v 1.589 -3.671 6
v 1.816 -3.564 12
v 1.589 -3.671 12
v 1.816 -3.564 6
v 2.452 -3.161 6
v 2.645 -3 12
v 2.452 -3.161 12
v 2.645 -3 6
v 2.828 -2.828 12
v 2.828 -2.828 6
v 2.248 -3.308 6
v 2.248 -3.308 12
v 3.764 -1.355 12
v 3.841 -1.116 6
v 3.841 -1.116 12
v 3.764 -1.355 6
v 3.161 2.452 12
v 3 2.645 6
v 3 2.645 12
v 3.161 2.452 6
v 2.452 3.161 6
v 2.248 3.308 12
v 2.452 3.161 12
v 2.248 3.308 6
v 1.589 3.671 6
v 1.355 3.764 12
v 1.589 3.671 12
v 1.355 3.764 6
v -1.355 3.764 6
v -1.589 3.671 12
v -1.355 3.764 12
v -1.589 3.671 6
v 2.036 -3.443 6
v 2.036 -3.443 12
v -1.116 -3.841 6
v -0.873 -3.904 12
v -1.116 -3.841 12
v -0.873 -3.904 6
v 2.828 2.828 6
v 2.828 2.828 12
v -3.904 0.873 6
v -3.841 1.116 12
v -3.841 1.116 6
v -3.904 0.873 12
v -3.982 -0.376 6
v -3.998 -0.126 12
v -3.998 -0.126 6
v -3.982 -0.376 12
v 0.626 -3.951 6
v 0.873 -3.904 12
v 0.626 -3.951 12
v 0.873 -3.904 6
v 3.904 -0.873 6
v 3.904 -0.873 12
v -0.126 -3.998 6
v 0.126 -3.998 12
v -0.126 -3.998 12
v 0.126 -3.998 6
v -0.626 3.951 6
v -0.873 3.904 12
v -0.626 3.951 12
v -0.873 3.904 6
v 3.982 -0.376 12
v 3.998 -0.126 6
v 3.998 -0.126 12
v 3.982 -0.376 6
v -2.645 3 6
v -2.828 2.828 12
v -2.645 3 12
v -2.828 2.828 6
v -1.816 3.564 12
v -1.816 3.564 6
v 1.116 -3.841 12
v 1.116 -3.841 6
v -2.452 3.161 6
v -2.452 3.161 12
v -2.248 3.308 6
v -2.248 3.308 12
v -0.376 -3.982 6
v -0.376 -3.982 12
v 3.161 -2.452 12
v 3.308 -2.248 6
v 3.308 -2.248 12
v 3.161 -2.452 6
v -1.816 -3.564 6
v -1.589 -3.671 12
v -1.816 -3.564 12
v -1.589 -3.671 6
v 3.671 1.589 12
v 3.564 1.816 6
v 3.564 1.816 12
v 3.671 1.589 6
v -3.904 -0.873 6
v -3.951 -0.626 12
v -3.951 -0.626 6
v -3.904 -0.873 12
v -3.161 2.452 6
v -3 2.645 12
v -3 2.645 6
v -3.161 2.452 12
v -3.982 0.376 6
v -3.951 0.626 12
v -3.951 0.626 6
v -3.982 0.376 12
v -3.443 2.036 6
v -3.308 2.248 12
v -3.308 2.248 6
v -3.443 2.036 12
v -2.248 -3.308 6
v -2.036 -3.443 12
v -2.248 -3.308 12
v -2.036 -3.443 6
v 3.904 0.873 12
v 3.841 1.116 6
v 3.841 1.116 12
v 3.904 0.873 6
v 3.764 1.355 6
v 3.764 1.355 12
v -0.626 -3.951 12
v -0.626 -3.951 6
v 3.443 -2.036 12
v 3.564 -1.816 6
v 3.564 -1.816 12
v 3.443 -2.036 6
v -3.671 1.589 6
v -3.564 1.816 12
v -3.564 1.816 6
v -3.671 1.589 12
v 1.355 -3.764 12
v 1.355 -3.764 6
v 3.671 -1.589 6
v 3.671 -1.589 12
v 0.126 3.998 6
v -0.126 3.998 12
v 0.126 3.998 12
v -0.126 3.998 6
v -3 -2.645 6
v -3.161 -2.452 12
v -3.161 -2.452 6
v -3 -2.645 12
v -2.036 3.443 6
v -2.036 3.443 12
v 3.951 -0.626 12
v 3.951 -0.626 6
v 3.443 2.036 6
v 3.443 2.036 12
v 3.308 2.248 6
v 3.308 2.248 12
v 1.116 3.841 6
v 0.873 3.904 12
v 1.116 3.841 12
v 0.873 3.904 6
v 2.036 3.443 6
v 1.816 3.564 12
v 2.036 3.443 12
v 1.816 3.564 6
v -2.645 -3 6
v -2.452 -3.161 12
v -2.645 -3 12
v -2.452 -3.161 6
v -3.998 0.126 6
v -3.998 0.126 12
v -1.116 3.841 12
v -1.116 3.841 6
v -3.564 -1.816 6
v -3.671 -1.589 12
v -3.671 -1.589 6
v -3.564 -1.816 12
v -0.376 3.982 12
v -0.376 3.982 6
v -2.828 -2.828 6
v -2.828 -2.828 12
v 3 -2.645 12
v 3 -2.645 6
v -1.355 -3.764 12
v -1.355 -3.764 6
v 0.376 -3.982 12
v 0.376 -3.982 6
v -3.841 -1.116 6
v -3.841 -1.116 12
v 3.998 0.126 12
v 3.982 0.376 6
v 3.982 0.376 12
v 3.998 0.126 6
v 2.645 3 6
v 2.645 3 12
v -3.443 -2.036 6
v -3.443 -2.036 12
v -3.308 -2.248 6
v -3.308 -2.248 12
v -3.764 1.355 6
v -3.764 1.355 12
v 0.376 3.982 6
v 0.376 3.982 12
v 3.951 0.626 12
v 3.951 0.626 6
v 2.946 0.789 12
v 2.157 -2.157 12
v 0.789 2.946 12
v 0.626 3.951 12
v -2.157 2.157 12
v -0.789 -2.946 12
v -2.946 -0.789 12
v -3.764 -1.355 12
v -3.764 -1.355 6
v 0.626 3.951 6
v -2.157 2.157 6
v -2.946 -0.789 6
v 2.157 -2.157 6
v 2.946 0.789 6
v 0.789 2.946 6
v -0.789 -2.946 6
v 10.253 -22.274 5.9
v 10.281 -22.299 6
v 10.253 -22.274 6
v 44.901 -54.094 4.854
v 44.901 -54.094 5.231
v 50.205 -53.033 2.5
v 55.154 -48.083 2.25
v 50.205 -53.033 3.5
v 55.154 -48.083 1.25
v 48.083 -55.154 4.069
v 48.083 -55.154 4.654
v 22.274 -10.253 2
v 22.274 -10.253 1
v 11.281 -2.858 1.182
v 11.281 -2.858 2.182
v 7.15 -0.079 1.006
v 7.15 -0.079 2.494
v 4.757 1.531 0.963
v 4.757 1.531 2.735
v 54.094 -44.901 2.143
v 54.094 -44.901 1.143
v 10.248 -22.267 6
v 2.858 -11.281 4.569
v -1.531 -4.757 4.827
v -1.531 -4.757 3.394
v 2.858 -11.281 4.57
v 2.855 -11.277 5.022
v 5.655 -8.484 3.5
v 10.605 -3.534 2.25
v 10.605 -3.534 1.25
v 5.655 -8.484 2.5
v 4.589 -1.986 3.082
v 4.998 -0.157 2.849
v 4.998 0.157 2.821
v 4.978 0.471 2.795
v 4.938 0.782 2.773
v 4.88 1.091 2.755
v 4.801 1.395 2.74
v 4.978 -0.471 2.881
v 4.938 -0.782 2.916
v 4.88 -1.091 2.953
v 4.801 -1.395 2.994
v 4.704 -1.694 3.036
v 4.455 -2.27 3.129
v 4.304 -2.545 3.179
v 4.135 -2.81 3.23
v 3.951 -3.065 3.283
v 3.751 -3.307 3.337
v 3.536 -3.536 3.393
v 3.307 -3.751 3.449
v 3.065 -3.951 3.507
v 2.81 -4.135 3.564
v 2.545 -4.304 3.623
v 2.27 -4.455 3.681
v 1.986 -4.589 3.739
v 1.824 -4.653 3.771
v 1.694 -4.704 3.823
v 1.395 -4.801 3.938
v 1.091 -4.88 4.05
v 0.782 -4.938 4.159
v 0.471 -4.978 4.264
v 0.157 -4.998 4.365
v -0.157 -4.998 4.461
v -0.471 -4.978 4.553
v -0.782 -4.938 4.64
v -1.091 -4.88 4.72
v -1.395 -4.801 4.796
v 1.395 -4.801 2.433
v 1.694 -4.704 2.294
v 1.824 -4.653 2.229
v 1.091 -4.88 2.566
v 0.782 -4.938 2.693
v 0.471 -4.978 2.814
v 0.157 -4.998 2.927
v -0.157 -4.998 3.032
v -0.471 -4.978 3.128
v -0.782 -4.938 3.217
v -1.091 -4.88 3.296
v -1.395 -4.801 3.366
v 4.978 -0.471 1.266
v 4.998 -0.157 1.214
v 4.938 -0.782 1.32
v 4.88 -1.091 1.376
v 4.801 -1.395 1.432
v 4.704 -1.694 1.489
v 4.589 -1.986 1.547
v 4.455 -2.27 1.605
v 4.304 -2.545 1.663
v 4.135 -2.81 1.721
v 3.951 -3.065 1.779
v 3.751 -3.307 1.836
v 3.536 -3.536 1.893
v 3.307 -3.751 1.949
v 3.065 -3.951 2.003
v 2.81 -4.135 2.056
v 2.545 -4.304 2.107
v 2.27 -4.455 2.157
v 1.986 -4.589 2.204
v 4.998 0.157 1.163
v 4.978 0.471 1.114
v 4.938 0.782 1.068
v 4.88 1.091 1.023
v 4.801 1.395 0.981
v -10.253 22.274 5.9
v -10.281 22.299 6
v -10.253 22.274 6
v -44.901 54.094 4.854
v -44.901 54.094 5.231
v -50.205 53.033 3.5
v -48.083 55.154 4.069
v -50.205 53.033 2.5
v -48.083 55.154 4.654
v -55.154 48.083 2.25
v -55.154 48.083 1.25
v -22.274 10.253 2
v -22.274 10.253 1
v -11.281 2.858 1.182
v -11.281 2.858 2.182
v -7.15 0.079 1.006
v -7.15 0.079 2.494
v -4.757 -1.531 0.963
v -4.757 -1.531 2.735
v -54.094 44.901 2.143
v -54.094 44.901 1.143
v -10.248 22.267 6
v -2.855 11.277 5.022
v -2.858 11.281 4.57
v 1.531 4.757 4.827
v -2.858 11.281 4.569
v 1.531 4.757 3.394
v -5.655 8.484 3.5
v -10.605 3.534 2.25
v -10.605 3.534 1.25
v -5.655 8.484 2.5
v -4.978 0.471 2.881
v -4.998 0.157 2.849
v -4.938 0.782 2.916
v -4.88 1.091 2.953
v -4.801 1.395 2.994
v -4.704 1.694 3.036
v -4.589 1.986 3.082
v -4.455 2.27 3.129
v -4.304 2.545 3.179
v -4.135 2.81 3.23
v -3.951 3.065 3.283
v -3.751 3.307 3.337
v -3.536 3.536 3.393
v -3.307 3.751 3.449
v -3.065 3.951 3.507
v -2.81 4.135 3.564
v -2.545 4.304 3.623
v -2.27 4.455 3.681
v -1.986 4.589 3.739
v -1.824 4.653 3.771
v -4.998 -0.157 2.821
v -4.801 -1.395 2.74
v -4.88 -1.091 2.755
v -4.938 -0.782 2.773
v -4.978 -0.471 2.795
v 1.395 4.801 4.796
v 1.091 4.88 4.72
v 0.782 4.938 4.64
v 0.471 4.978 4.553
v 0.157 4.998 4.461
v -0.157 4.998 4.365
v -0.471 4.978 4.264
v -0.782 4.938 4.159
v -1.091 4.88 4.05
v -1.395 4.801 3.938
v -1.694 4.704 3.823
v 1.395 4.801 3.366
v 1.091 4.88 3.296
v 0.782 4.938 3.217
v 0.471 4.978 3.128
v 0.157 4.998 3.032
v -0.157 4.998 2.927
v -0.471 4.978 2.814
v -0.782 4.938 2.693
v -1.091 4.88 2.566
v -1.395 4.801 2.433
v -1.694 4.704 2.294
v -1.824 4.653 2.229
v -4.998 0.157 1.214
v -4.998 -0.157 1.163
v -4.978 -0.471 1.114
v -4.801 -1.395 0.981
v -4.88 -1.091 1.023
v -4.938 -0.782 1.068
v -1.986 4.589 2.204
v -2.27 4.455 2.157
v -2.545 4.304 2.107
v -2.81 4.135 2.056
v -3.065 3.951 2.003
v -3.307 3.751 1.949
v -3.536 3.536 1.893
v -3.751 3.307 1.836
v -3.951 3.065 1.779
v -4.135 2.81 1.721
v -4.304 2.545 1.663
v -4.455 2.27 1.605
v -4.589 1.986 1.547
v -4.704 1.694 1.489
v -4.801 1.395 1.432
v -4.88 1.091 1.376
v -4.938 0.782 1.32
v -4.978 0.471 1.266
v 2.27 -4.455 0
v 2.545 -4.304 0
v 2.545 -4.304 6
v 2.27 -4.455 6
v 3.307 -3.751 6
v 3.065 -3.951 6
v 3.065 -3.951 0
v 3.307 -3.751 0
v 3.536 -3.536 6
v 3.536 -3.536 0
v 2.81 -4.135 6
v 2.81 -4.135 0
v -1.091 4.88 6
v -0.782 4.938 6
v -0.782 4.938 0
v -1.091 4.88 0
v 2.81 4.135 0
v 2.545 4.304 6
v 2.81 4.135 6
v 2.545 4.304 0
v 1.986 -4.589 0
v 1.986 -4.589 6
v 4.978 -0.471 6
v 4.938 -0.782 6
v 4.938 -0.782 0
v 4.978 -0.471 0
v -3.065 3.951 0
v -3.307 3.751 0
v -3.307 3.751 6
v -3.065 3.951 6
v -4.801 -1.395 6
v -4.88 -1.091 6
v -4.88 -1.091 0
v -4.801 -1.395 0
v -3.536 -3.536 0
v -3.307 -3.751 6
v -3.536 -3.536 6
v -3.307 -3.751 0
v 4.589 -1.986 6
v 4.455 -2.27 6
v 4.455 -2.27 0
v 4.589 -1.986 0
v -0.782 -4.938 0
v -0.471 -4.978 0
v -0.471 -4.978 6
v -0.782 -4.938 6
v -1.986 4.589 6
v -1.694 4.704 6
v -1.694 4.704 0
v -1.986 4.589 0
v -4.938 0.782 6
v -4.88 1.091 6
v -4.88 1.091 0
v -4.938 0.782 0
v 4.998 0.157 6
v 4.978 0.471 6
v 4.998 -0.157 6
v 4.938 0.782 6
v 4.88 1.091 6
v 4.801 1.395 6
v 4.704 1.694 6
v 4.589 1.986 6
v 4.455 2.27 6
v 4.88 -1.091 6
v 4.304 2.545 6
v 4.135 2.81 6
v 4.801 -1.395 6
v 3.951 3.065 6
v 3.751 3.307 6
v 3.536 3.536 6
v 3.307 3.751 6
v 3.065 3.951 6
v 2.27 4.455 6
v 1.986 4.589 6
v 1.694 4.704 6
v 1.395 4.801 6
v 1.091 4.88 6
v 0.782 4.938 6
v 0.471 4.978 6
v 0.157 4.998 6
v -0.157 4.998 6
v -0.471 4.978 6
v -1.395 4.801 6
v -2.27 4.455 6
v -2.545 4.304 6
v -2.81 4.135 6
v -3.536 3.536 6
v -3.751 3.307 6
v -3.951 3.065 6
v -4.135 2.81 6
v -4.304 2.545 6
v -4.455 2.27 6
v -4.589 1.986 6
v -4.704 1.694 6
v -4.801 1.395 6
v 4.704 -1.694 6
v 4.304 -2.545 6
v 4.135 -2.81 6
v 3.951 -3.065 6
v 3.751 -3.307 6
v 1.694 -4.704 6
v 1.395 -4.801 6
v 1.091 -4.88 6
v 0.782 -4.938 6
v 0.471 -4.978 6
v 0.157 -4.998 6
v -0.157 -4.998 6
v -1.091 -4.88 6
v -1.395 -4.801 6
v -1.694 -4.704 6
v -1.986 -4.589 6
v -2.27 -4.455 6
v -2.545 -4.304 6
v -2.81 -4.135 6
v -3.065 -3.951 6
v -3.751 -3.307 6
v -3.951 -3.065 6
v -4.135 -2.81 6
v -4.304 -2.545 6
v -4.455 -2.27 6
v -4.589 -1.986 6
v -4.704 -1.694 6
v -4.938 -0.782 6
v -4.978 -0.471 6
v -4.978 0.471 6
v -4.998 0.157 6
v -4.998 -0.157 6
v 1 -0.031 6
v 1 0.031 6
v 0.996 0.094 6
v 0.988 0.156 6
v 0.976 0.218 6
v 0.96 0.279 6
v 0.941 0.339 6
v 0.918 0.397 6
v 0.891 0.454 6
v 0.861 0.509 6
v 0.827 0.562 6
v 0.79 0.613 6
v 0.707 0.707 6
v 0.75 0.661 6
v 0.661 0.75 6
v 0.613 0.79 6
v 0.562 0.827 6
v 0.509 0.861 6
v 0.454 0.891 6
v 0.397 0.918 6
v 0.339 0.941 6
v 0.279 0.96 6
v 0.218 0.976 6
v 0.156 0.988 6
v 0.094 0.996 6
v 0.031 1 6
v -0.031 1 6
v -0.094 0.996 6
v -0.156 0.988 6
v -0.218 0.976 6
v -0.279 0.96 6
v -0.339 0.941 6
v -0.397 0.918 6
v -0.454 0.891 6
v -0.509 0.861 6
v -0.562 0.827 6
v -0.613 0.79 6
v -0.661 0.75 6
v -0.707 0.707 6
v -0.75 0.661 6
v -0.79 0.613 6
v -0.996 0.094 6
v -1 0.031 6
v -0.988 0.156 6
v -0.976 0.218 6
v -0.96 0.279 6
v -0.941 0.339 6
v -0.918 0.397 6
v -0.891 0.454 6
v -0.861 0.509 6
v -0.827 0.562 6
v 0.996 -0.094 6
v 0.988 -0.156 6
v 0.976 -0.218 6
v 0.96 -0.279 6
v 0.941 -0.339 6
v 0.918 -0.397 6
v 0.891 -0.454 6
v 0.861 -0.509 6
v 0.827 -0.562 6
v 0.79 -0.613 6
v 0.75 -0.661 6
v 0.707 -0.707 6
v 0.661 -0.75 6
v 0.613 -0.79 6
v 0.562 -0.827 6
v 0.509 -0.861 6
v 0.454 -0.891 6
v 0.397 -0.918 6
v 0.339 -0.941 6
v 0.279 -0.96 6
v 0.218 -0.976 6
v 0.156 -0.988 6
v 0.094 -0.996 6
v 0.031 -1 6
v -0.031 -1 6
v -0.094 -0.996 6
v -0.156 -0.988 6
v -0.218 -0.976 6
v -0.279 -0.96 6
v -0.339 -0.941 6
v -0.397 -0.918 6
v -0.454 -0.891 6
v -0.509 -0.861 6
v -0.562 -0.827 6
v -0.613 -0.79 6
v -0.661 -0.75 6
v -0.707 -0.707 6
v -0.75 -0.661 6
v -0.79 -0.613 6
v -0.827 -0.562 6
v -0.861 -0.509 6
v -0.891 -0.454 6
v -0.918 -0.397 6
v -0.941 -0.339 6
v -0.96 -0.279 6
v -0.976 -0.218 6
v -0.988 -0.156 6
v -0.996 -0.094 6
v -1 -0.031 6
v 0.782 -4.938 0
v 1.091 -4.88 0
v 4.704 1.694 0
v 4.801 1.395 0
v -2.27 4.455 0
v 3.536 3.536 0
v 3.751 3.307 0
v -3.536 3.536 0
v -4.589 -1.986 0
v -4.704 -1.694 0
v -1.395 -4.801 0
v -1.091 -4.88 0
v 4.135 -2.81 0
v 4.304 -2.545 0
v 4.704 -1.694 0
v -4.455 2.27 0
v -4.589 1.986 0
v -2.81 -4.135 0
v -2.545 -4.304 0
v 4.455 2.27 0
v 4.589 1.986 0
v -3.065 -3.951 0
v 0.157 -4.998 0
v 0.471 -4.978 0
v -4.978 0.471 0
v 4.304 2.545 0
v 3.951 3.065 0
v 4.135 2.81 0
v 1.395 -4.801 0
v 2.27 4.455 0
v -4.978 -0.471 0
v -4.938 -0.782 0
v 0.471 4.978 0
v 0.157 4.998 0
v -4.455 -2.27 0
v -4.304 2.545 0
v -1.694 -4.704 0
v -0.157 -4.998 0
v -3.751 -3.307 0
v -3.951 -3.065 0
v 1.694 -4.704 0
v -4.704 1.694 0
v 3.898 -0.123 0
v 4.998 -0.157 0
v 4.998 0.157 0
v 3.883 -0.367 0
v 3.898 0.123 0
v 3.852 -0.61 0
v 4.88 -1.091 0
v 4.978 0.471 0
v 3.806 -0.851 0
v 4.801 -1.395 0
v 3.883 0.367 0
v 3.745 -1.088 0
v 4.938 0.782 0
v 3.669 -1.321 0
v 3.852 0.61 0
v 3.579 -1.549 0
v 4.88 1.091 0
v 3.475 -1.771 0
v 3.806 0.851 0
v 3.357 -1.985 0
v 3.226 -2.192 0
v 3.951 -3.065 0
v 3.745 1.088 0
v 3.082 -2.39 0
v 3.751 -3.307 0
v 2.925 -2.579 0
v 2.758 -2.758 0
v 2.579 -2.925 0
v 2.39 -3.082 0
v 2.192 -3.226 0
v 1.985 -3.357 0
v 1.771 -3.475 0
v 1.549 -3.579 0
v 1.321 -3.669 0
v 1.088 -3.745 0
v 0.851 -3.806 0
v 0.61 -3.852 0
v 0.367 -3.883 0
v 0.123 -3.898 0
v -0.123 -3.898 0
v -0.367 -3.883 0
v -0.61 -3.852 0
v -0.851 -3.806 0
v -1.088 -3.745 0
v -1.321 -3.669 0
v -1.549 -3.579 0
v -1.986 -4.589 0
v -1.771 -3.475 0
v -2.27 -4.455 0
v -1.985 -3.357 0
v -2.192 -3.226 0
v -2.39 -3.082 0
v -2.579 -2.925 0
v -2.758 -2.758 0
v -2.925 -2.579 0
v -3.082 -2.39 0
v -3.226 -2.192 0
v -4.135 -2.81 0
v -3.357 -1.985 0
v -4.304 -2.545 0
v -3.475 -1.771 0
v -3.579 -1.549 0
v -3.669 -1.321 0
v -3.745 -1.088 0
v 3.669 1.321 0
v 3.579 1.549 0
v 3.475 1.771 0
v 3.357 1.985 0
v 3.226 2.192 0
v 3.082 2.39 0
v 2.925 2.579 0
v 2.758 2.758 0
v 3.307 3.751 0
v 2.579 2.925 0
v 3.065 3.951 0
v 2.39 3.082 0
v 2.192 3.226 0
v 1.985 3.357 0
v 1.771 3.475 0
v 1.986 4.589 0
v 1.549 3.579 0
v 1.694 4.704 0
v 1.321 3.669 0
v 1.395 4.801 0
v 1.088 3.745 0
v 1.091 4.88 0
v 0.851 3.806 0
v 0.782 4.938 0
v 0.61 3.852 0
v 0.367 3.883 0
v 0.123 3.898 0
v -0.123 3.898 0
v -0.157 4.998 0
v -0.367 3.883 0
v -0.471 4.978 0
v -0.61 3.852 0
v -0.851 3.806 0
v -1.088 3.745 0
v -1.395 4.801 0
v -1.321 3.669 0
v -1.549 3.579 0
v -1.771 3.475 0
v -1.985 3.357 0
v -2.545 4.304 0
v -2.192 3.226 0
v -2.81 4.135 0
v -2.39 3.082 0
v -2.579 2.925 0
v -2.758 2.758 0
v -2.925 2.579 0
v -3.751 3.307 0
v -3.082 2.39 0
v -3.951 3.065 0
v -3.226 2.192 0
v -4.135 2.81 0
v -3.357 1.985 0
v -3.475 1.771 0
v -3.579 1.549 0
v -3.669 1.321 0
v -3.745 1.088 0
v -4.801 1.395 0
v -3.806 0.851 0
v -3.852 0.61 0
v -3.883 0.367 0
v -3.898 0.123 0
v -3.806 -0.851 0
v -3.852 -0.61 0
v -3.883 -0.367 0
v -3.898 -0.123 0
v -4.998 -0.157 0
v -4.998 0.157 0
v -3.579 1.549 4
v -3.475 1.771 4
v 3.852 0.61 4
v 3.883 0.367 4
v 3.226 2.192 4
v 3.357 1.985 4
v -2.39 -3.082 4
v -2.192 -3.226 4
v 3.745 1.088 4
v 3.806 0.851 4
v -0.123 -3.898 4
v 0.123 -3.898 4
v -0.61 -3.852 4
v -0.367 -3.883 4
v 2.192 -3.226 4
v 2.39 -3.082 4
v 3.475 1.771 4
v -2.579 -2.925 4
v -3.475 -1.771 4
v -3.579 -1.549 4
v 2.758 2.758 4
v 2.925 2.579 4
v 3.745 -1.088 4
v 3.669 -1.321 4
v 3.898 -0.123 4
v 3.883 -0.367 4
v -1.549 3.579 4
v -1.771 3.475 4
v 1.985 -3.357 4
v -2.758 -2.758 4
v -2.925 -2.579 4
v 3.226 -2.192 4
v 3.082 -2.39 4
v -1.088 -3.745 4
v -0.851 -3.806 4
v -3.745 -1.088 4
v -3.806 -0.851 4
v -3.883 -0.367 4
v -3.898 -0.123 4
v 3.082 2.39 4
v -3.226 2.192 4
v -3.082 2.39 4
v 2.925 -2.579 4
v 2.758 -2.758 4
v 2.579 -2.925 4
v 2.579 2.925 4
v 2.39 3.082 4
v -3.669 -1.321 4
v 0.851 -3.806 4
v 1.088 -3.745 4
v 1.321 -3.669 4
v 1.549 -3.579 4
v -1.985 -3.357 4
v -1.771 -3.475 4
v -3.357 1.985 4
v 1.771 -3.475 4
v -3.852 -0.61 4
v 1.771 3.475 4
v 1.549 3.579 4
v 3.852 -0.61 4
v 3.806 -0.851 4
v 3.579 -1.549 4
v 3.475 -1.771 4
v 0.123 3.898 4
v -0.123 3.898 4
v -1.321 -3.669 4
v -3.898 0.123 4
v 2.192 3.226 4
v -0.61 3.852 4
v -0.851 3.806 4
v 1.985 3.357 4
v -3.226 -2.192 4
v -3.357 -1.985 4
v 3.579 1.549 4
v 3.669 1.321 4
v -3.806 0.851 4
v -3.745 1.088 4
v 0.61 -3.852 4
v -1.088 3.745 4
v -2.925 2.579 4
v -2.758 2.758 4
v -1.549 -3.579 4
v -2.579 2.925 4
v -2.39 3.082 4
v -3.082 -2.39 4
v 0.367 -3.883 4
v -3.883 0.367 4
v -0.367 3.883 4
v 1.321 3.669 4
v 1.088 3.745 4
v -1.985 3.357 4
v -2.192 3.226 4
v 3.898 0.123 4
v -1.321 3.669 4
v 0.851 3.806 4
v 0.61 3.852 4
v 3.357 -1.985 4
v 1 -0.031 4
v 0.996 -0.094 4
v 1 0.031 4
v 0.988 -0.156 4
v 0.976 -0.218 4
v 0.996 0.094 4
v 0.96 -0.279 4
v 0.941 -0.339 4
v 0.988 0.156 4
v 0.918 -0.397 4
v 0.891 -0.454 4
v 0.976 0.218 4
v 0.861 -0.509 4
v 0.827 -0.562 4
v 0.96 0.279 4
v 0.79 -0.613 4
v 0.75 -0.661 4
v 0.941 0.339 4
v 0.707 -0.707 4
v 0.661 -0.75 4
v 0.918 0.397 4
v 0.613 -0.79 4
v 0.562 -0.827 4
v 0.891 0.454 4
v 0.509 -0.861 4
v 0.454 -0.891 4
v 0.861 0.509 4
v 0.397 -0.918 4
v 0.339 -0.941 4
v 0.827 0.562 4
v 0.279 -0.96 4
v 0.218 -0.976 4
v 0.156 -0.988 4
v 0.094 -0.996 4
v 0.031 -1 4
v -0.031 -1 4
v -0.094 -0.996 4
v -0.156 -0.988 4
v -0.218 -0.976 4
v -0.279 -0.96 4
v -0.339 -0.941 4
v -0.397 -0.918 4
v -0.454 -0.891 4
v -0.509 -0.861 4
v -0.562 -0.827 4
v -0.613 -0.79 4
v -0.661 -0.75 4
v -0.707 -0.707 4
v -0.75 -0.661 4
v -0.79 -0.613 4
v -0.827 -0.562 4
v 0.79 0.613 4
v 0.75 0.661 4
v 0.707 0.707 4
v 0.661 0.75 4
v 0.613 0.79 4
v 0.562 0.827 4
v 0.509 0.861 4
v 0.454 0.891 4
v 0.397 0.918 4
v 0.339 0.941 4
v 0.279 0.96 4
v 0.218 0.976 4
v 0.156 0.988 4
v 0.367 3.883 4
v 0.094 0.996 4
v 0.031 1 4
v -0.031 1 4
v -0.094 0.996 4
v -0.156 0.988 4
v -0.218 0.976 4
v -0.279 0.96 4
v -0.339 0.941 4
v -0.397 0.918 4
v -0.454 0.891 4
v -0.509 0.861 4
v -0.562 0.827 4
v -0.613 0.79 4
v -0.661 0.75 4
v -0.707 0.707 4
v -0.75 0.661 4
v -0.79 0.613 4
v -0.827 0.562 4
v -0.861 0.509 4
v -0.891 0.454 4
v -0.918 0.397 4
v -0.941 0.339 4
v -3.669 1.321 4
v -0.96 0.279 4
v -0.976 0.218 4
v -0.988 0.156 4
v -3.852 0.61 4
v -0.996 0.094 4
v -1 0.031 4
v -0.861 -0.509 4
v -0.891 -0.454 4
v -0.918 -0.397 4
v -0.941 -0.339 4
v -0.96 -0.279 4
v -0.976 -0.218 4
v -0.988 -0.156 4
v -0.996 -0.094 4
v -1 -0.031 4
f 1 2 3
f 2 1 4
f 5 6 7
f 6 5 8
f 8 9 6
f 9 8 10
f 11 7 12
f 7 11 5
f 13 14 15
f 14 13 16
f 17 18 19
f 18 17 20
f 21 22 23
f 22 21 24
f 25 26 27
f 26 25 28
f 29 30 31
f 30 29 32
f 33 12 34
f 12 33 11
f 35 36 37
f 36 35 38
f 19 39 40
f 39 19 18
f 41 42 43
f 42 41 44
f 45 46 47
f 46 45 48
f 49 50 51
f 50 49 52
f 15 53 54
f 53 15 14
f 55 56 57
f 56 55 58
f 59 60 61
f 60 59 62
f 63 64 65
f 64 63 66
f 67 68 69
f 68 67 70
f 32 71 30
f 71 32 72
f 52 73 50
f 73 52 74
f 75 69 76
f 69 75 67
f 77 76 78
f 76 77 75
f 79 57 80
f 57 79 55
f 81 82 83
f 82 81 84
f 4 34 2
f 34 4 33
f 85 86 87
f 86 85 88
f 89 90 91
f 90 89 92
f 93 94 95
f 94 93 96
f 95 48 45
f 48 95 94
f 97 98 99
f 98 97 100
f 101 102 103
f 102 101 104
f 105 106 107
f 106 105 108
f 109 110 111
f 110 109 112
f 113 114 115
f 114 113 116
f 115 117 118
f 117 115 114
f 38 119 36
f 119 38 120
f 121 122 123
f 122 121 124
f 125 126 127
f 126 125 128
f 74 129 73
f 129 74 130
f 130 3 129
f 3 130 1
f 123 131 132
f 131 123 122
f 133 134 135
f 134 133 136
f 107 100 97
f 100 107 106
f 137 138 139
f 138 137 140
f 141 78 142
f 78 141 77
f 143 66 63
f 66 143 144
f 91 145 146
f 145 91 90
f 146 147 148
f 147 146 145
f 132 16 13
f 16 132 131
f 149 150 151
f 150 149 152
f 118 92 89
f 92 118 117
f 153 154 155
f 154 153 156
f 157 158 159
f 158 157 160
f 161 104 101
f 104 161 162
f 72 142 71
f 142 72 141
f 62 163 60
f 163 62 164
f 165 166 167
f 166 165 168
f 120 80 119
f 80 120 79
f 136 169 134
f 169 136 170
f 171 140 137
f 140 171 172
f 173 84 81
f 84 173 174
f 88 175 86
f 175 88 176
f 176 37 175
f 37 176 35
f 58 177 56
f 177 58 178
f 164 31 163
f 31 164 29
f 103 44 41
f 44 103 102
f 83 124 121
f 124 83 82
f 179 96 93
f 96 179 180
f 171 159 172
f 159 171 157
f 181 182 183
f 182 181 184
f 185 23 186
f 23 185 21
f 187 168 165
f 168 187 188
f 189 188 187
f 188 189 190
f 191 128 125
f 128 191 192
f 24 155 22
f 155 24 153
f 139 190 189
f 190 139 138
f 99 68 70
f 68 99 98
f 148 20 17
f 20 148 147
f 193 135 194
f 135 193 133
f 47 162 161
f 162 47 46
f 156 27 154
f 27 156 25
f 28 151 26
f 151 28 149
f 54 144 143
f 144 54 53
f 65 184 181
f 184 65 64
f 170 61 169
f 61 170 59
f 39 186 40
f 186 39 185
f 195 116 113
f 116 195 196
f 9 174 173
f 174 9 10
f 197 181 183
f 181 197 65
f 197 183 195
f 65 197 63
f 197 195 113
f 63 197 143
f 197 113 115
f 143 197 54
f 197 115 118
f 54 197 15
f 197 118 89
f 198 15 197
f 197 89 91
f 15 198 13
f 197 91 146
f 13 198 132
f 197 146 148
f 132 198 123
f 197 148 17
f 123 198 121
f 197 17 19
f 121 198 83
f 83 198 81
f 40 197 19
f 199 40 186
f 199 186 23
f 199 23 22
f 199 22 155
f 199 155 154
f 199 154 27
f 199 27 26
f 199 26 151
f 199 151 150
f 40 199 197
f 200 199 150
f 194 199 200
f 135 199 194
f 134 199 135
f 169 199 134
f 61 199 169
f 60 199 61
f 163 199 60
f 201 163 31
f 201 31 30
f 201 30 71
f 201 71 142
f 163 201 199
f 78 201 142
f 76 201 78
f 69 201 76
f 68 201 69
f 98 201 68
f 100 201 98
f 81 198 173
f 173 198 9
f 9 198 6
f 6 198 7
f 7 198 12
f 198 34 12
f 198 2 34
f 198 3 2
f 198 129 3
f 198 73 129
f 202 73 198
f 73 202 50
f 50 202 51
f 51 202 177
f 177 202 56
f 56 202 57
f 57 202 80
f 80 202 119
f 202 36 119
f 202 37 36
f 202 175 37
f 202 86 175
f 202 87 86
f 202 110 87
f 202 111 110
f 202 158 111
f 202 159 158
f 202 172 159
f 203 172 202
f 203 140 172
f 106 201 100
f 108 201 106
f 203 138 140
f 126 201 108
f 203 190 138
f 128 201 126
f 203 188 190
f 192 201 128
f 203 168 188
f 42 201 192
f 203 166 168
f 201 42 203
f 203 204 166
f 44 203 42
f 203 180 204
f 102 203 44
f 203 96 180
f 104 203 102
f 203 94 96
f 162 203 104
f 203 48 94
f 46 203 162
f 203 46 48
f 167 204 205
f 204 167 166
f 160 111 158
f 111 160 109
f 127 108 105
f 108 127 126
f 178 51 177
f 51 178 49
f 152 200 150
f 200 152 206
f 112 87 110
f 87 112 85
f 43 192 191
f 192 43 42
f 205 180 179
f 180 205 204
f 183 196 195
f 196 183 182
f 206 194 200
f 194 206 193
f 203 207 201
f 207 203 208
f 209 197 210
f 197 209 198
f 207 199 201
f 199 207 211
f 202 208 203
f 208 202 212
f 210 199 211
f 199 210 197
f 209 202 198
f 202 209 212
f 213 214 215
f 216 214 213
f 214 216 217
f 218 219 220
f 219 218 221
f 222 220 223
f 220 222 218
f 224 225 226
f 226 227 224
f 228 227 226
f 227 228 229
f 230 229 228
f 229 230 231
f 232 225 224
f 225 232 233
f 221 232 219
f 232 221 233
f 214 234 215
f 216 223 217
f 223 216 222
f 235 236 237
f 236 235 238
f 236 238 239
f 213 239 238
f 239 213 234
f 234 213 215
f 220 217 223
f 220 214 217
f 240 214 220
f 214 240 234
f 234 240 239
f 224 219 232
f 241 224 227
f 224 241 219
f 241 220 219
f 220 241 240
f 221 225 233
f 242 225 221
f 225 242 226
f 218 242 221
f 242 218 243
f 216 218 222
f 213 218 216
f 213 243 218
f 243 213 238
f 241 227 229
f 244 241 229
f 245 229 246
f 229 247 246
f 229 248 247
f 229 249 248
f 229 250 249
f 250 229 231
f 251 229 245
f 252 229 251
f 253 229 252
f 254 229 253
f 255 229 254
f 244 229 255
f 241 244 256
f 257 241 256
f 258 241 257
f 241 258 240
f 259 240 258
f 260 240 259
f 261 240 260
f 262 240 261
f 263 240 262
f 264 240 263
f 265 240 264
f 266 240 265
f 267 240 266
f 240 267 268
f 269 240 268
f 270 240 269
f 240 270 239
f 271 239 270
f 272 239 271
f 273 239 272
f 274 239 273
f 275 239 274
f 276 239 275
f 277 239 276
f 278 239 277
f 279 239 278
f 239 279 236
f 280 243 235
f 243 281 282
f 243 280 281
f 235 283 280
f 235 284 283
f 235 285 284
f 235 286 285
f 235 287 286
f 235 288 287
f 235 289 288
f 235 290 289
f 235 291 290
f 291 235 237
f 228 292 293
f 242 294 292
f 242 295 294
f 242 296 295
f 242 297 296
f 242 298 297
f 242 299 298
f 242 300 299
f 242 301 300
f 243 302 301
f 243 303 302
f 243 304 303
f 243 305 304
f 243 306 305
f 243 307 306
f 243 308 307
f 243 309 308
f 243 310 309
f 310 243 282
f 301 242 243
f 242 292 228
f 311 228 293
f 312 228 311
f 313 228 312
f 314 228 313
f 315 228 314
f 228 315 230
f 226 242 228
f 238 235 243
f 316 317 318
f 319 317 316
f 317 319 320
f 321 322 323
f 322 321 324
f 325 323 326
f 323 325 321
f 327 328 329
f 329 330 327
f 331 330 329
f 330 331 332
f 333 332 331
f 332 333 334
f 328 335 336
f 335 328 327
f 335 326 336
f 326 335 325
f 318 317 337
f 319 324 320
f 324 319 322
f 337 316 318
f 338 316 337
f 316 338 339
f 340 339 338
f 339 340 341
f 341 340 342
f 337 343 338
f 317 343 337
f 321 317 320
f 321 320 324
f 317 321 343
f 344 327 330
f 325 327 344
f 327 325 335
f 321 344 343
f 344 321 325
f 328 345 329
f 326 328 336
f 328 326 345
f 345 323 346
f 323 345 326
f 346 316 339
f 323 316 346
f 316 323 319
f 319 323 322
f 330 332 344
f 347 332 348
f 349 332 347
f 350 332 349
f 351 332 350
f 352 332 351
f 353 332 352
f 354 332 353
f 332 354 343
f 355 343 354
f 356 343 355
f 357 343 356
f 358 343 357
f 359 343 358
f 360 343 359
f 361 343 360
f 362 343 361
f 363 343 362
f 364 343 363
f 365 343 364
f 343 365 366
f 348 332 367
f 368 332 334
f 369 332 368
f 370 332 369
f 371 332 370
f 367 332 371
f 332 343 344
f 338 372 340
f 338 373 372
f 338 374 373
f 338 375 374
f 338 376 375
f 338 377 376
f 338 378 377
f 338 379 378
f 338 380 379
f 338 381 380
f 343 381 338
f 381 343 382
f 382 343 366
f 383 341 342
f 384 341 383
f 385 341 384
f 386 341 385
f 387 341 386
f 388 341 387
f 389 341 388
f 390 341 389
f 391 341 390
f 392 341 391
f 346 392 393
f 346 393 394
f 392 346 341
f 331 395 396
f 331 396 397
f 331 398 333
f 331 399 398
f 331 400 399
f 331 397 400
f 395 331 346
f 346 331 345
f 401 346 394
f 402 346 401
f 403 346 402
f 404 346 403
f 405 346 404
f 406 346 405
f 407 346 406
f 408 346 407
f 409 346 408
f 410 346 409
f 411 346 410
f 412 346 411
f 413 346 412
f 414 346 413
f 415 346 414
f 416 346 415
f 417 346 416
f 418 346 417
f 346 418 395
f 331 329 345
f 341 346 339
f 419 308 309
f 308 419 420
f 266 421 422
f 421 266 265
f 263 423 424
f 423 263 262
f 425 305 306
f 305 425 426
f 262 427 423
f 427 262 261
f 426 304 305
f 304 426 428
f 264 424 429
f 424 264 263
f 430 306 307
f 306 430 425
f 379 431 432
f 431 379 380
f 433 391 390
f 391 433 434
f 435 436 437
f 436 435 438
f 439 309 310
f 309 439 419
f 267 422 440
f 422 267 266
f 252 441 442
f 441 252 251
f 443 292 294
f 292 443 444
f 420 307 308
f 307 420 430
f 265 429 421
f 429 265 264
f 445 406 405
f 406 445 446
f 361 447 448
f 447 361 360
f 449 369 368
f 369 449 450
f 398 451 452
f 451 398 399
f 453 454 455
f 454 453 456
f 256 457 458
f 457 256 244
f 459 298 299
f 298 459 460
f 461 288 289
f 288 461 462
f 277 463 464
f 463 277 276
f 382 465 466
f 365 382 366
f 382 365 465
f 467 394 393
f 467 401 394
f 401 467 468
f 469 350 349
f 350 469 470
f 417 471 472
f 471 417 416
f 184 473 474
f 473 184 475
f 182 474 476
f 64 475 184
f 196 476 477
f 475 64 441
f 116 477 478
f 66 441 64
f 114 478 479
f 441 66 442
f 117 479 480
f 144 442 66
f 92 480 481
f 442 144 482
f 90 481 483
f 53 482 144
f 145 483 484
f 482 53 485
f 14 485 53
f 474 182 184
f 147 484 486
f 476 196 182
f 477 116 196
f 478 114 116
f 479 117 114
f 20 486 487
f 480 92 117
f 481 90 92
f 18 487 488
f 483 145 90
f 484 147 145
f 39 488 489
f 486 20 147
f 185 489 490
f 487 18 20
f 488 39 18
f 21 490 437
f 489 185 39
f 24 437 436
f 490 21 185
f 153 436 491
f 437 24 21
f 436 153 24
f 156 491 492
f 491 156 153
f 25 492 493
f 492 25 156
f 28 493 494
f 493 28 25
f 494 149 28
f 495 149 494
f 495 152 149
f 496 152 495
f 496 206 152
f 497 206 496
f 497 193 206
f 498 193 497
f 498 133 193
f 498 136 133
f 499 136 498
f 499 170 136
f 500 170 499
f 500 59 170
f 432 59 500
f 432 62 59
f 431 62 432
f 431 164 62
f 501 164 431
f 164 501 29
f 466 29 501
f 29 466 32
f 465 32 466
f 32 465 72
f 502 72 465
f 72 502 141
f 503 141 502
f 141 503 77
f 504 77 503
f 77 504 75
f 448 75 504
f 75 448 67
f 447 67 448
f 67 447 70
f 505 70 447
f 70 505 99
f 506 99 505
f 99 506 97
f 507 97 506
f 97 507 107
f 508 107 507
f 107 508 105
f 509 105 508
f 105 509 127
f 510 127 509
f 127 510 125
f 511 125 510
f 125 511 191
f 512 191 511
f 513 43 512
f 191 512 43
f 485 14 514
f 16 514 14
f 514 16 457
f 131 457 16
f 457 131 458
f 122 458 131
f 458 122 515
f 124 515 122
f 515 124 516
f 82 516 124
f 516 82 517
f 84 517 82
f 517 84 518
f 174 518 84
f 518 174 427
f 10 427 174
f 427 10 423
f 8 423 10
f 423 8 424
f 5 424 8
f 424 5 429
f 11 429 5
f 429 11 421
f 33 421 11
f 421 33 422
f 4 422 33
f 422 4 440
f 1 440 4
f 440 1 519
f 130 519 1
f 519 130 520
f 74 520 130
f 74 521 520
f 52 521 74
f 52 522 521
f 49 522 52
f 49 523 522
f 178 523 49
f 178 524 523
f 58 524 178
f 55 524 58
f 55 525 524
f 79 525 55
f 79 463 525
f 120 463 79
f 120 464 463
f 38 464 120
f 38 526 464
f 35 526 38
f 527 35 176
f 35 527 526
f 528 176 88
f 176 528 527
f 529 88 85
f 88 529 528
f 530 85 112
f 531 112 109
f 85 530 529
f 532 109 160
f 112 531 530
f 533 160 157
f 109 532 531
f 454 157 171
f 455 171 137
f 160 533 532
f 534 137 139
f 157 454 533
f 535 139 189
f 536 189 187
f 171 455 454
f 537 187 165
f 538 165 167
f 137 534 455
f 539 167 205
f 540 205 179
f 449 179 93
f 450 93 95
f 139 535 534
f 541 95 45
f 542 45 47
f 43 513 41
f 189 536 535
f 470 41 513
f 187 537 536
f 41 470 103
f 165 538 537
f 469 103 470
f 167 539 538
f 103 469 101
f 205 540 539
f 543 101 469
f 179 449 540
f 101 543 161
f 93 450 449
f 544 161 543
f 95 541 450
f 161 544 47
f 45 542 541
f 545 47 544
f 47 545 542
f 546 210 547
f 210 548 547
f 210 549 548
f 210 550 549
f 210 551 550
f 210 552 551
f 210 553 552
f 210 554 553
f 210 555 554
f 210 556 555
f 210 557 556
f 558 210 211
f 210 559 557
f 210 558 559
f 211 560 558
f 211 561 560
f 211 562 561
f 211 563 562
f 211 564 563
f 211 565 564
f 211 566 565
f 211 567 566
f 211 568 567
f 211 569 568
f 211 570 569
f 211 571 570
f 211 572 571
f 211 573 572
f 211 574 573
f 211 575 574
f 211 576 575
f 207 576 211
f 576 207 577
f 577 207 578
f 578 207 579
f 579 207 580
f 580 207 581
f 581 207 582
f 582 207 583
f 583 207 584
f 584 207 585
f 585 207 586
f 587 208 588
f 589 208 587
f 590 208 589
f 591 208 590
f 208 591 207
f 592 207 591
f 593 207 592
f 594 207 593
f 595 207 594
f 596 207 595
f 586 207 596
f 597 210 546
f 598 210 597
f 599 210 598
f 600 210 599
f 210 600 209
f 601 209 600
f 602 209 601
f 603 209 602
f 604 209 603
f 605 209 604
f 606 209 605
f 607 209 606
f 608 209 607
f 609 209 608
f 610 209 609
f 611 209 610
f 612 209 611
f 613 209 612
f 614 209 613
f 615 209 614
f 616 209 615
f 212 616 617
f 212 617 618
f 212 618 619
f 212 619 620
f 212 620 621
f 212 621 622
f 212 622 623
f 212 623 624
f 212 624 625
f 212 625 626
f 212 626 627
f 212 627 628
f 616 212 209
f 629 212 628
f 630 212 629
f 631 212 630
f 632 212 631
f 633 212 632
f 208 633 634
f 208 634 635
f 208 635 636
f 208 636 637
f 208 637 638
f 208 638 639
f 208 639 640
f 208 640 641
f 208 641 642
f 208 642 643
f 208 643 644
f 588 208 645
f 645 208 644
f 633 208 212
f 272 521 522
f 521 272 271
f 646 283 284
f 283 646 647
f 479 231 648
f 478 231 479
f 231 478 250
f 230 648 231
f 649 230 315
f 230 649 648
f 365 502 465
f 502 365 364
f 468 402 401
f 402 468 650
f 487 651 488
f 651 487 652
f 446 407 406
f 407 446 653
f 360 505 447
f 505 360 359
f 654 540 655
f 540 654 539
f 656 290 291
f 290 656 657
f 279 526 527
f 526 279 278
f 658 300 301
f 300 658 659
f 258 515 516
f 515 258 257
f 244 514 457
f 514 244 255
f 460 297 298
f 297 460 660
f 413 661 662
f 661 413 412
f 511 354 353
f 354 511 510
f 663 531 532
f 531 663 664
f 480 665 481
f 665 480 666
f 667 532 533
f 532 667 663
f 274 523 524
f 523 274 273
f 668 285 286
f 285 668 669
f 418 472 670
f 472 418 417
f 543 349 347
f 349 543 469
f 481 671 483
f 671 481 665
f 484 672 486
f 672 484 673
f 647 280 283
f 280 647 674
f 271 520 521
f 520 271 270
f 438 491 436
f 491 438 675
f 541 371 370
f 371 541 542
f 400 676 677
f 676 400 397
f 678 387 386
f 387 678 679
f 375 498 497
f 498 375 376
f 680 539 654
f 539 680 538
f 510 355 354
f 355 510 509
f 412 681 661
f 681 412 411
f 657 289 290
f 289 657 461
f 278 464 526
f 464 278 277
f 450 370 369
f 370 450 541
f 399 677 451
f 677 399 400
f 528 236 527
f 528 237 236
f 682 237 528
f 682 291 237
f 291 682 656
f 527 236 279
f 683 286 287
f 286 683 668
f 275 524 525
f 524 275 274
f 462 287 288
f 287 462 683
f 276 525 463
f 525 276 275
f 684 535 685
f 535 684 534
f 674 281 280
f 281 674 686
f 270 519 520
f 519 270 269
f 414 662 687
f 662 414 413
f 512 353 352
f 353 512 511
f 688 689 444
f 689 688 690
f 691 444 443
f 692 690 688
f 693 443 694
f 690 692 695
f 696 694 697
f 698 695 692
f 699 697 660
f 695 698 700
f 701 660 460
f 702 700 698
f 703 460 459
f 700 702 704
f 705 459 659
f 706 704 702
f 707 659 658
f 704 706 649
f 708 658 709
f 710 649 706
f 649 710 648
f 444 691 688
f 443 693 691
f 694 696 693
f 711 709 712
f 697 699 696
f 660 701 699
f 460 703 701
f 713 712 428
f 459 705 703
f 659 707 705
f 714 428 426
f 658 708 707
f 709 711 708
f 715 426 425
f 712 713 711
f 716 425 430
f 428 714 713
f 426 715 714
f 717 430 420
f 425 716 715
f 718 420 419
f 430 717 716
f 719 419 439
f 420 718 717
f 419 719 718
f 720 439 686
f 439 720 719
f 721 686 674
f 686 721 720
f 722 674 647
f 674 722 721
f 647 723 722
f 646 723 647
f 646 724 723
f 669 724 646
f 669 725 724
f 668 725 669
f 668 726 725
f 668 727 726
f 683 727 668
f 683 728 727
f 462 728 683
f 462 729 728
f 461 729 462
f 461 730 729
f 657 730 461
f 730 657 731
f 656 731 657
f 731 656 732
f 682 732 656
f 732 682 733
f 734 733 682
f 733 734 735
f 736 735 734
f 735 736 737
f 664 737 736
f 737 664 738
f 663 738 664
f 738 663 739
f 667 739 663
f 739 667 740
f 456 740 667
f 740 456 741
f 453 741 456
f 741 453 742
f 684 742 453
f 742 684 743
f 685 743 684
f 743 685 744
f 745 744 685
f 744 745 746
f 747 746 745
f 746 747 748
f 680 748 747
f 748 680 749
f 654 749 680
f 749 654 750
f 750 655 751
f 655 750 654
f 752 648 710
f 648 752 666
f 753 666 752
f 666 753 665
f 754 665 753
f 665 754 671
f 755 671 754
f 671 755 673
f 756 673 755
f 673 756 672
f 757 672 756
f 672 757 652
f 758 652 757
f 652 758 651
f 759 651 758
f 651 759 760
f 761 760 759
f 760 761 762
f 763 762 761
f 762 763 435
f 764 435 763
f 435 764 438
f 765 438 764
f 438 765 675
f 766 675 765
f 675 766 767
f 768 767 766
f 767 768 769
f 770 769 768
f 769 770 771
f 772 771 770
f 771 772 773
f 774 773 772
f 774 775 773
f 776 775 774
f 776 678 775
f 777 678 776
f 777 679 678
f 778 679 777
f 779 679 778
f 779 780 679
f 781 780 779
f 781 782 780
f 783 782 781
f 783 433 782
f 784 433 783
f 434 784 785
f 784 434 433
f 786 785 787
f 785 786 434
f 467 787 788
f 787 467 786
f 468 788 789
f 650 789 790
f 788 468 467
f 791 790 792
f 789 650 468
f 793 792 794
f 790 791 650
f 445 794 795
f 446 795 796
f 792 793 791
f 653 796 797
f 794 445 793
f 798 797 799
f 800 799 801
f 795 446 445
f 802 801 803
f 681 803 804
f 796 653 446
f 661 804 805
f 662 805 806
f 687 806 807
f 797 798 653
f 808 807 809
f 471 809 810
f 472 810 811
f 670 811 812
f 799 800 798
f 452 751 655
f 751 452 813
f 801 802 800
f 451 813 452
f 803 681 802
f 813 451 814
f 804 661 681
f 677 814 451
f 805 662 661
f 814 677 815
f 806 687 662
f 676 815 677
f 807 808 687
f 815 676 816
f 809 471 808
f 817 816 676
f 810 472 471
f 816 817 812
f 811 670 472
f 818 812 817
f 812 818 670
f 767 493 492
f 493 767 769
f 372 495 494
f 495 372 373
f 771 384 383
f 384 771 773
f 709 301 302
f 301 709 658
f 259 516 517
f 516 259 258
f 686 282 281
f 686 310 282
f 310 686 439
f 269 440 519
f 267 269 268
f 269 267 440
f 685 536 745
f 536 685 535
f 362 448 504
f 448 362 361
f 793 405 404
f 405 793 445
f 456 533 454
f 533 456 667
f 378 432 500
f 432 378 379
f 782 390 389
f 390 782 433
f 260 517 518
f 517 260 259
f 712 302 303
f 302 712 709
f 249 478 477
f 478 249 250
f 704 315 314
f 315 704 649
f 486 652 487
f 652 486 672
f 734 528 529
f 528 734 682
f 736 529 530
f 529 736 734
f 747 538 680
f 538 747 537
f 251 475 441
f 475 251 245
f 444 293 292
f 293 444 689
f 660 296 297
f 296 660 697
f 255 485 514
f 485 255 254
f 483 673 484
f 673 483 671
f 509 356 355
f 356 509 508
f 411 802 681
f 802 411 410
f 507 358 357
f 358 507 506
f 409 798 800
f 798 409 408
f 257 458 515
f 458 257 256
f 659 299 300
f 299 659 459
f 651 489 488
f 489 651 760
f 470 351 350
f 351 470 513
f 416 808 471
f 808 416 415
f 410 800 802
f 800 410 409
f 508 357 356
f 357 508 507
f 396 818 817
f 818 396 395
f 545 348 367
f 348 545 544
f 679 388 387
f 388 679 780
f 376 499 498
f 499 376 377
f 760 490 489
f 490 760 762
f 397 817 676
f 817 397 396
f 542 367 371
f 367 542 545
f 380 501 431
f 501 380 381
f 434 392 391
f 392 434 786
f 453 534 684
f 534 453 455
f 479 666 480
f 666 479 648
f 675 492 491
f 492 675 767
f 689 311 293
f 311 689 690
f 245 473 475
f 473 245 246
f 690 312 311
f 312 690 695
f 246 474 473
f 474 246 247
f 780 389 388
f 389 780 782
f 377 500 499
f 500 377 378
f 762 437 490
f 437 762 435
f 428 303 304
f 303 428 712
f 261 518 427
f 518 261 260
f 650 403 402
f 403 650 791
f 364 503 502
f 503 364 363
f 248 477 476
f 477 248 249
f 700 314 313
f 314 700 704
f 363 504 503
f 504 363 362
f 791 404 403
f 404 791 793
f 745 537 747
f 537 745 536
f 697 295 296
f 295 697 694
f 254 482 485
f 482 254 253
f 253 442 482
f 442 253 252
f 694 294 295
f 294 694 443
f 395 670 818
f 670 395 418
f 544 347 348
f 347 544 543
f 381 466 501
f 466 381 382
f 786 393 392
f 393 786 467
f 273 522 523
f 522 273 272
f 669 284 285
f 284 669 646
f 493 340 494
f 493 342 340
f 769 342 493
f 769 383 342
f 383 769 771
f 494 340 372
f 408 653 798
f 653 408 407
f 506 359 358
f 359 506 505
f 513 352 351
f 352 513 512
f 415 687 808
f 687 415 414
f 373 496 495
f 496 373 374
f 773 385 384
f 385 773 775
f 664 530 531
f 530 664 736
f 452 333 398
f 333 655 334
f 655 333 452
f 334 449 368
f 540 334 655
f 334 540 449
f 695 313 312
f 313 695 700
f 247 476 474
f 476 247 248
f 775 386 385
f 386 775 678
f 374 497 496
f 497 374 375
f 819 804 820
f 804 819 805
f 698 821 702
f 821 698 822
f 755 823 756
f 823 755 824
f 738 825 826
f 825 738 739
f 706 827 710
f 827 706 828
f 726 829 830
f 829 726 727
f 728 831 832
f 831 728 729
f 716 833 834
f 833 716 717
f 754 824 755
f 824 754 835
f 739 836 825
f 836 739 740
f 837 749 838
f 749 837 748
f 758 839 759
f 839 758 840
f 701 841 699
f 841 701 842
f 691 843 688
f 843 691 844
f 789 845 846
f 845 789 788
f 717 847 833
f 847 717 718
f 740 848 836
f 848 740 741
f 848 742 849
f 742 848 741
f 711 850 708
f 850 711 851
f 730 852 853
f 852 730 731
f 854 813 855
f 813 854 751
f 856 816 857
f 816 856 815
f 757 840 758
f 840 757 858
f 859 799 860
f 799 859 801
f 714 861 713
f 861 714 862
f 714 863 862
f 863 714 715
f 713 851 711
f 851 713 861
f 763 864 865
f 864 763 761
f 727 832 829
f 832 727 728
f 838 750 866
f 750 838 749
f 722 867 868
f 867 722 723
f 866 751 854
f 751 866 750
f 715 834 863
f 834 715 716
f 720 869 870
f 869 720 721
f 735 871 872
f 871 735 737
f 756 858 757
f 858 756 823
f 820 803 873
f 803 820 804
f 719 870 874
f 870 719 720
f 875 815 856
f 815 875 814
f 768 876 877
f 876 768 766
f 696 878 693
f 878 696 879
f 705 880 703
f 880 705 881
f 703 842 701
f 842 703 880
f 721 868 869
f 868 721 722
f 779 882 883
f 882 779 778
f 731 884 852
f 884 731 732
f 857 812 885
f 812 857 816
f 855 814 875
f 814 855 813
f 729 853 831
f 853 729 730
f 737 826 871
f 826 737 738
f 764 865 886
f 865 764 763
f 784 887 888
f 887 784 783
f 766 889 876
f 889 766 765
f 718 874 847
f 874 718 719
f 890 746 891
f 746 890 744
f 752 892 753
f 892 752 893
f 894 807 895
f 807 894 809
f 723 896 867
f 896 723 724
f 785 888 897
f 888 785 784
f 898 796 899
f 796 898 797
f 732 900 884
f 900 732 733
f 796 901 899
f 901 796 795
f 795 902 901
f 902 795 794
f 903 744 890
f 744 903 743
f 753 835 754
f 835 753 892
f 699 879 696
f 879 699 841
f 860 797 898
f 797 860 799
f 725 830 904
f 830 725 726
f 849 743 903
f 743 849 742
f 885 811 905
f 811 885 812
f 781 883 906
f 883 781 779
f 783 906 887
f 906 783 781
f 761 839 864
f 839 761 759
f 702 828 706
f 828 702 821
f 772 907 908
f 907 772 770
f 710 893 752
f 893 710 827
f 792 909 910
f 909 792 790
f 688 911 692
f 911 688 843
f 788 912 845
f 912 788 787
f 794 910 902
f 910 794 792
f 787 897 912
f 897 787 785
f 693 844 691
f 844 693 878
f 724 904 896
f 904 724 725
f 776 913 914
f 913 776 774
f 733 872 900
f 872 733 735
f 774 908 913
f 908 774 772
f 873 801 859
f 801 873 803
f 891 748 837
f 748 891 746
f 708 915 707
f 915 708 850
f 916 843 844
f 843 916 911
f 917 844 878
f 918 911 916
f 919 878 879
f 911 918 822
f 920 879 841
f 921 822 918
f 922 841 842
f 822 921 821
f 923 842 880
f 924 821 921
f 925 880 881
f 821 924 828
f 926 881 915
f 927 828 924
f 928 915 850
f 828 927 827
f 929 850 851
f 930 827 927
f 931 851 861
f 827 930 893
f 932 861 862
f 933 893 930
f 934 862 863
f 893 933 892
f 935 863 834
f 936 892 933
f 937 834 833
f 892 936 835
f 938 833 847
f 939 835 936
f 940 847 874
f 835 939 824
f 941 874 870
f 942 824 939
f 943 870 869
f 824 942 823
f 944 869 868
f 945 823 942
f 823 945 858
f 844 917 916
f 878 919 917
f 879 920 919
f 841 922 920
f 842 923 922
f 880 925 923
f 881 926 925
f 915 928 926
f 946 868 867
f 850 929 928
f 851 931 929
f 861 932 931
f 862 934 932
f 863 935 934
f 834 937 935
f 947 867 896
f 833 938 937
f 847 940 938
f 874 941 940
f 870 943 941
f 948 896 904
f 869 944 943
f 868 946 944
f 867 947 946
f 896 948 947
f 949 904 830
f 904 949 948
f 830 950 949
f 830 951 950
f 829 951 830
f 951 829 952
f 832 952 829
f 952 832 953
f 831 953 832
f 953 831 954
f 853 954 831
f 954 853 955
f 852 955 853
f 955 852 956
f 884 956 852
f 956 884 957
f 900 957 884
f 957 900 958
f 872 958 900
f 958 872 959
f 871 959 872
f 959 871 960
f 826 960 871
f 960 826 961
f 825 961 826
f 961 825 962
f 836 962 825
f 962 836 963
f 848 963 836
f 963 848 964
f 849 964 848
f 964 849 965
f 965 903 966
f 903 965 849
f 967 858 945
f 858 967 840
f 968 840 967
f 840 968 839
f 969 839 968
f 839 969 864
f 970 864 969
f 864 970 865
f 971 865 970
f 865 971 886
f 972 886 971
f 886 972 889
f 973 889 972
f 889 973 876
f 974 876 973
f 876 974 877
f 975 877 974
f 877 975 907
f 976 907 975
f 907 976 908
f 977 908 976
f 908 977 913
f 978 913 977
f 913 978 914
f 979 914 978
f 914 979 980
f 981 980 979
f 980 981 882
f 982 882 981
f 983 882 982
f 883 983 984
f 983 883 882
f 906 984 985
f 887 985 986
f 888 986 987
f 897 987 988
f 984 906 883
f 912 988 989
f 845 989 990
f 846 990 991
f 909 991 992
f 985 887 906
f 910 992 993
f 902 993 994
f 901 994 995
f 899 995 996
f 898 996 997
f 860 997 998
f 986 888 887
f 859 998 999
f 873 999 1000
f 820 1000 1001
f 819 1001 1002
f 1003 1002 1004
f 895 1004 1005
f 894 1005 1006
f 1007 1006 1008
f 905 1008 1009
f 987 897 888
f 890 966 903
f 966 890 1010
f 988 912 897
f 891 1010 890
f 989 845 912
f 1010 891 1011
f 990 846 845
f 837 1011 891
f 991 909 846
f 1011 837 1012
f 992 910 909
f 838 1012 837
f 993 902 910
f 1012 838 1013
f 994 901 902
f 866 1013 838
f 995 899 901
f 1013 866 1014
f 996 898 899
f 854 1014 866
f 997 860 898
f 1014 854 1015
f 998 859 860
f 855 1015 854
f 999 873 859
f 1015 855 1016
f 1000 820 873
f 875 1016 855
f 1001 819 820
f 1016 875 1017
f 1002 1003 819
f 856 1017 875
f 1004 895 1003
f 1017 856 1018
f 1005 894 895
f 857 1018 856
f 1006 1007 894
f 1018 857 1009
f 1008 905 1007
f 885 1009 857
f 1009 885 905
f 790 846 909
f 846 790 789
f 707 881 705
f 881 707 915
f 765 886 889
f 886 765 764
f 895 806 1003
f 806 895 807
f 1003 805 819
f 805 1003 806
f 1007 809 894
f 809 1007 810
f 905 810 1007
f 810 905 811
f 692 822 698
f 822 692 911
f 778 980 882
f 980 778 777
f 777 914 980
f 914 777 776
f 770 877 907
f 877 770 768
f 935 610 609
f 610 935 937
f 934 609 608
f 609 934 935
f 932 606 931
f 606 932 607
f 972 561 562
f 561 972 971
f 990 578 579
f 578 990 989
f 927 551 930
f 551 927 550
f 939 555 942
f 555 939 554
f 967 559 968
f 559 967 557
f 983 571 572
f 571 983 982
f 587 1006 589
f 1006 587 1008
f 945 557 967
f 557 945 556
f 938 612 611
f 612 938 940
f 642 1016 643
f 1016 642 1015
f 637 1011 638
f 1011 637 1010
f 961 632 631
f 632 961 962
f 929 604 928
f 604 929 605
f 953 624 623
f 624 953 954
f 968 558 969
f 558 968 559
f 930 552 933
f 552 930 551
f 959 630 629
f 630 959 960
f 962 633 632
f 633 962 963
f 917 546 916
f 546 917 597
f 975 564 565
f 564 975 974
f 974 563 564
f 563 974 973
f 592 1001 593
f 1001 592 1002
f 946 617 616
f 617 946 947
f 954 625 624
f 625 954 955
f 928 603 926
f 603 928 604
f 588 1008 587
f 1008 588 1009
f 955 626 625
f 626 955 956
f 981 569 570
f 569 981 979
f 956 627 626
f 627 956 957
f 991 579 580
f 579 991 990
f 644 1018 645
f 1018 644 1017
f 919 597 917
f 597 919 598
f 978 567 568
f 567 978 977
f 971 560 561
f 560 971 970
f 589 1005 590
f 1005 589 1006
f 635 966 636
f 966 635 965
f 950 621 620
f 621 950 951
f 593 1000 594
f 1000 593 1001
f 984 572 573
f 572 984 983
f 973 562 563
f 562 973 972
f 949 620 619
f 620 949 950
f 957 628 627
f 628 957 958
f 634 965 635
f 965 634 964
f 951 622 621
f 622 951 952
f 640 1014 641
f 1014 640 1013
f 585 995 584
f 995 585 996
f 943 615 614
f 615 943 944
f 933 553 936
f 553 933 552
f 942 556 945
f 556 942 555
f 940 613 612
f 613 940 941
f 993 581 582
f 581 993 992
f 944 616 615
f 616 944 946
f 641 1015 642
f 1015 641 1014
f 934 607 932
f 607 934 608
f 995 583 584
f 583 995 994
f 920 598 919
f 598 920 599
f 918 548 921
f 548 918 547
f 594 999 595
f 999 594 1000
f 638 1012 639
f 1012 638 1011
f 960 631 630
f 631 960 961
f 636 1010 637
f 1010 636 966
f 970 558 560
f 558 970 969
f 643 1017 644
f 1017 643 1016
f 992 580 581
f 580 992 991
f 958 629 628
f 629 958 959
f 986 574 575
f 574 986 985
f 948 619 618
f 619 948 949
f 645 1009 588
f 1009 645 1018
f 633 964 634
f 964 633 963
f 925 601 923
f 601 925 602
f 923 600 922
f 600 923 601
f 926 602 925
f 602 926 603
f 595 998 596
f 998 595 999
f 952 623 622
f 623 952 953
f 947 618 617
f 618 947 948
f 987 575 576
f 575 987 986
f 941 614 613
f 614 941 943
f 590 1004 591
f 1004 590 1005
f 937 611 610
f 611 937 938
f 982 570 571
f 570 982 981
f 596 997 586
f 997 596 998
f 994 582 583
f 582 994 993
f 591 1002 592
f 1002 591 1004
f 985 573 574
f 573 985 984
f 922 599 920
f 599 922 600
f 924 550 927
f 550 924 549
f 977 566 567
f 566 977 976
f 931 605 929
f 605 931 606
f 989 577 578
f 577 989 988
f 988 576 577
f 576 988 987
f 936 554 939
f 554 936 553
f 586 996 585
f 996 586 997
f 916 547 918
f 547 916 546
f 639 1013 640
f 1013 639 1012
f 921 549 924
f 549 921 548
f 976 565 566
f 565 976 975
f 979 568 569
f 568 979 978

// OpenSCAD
mirror=0;


function ngon(count, radius, i = 0, result = []) = i < count
    ? ngon(count, radius, i + 1, concat(result, [[ radius*sin(360/count*i), radius*cos(360/count*i) ]]))
    : result;
    
module blade_wedge(){

    translate([-0.002,0,0])
    rotate([90,0,90])
    polyhedron(points=
    [[-8.502,3.5,0],
    [-5,3.25,0],
    [2,2,0],
    [8.502,-0.501,0],
    [8.502,0.6-0.001,0],
    [2,4,0],
    [-5,5.25,0],
    [-8.502,5.5,0],
    
    [-8.502,4,10],
    [-5,3.75,10],
    [2,2.5,10],
    [8.502,-0.001,10],
    [8.502,0.1-0.001,10],
    [2,3.5,10],
    [-5,4.75,10],
    [-8.502,5,10]],
    
    faces=[[0,7,15,8],
    [0,8,9,1],
    [1,9,10,2],
    [2,10,11,3],
    [3,11,12,4],
    [4,12,13,5],
    [5,13,14,6],
    [6,14,15,7],
    [0,1,2,3,4,5,6,7],
    [8,15,14,13,12,11,10,9]]);
}    
    
    
module blade(){
    difference(){
        linear_extrude(5,convexity=10)
        polygon([[0,-4],[23,-8.5],[70,-6.5],[73,-5],[73,5],[70,6.5],[23,8.5],[0,4],[0,-4]]);
        
            translate([-0.001,0,0])
            rotate([90,0,90])
            linear_extrude(73.002,convexity=10)
            polygon([[-8.501,4],[-5,3.75],[2,2.5],[8.501,-0.001],[-8.501,-0.001],[-8.501,4]]);
        
        
            translate([-0.001,0,0])
            rotate([90,0,90])
            linear_extrude(73.002,convexity=10)
            polygon([[-8.501,5],[-5,4.75],[2,3.5],[8.501,0.1-0.001],[8.501,6],[-8.501,6]]);
    }
    
    intersection(){
        blade_wedge();
        blade_shape();
    }
}

module blade_shape(){
    
        linear_extrude(6,convexity=10)
        polygon([[0,-4],[23,-8.5],[70,-6.5],[73,-5],[73,5],[70,6.5],[23,8.5],[0,4],[0,-4]]);
}

module propeller(){
        
    translate([0,0,6]){
        difference(){
            union(){
                translate([0,0,-6])
                difference(){
                    cylinder(6.001,4,4,$fn=100);
                    
                    translate([0,0,-0.001])
                    linear_extrude(7.501,convexity=10)
                    rotate([0,0,30])
                    polygon(ngon(6,6.1/2));
                }
                cylinder(6,5,5,$fn=100);
                blade();
                rotate([0,0,180])
                blade();
            }
            translate([0,0,2])
            cylinder(4.002,3.9,3.9,$fn=100);
            
            translate([0,0,-6])
            cylinder(12,1,1,$fn=100);
        }
    }
}


if (mirror){
    mirror([0,1,0])
    translate([0,0,12])
    rotate([180,0,45])
    propeller();
}else{
    translate([0,0,12])
    rotate([180,0,-45])
    propeller();
}
